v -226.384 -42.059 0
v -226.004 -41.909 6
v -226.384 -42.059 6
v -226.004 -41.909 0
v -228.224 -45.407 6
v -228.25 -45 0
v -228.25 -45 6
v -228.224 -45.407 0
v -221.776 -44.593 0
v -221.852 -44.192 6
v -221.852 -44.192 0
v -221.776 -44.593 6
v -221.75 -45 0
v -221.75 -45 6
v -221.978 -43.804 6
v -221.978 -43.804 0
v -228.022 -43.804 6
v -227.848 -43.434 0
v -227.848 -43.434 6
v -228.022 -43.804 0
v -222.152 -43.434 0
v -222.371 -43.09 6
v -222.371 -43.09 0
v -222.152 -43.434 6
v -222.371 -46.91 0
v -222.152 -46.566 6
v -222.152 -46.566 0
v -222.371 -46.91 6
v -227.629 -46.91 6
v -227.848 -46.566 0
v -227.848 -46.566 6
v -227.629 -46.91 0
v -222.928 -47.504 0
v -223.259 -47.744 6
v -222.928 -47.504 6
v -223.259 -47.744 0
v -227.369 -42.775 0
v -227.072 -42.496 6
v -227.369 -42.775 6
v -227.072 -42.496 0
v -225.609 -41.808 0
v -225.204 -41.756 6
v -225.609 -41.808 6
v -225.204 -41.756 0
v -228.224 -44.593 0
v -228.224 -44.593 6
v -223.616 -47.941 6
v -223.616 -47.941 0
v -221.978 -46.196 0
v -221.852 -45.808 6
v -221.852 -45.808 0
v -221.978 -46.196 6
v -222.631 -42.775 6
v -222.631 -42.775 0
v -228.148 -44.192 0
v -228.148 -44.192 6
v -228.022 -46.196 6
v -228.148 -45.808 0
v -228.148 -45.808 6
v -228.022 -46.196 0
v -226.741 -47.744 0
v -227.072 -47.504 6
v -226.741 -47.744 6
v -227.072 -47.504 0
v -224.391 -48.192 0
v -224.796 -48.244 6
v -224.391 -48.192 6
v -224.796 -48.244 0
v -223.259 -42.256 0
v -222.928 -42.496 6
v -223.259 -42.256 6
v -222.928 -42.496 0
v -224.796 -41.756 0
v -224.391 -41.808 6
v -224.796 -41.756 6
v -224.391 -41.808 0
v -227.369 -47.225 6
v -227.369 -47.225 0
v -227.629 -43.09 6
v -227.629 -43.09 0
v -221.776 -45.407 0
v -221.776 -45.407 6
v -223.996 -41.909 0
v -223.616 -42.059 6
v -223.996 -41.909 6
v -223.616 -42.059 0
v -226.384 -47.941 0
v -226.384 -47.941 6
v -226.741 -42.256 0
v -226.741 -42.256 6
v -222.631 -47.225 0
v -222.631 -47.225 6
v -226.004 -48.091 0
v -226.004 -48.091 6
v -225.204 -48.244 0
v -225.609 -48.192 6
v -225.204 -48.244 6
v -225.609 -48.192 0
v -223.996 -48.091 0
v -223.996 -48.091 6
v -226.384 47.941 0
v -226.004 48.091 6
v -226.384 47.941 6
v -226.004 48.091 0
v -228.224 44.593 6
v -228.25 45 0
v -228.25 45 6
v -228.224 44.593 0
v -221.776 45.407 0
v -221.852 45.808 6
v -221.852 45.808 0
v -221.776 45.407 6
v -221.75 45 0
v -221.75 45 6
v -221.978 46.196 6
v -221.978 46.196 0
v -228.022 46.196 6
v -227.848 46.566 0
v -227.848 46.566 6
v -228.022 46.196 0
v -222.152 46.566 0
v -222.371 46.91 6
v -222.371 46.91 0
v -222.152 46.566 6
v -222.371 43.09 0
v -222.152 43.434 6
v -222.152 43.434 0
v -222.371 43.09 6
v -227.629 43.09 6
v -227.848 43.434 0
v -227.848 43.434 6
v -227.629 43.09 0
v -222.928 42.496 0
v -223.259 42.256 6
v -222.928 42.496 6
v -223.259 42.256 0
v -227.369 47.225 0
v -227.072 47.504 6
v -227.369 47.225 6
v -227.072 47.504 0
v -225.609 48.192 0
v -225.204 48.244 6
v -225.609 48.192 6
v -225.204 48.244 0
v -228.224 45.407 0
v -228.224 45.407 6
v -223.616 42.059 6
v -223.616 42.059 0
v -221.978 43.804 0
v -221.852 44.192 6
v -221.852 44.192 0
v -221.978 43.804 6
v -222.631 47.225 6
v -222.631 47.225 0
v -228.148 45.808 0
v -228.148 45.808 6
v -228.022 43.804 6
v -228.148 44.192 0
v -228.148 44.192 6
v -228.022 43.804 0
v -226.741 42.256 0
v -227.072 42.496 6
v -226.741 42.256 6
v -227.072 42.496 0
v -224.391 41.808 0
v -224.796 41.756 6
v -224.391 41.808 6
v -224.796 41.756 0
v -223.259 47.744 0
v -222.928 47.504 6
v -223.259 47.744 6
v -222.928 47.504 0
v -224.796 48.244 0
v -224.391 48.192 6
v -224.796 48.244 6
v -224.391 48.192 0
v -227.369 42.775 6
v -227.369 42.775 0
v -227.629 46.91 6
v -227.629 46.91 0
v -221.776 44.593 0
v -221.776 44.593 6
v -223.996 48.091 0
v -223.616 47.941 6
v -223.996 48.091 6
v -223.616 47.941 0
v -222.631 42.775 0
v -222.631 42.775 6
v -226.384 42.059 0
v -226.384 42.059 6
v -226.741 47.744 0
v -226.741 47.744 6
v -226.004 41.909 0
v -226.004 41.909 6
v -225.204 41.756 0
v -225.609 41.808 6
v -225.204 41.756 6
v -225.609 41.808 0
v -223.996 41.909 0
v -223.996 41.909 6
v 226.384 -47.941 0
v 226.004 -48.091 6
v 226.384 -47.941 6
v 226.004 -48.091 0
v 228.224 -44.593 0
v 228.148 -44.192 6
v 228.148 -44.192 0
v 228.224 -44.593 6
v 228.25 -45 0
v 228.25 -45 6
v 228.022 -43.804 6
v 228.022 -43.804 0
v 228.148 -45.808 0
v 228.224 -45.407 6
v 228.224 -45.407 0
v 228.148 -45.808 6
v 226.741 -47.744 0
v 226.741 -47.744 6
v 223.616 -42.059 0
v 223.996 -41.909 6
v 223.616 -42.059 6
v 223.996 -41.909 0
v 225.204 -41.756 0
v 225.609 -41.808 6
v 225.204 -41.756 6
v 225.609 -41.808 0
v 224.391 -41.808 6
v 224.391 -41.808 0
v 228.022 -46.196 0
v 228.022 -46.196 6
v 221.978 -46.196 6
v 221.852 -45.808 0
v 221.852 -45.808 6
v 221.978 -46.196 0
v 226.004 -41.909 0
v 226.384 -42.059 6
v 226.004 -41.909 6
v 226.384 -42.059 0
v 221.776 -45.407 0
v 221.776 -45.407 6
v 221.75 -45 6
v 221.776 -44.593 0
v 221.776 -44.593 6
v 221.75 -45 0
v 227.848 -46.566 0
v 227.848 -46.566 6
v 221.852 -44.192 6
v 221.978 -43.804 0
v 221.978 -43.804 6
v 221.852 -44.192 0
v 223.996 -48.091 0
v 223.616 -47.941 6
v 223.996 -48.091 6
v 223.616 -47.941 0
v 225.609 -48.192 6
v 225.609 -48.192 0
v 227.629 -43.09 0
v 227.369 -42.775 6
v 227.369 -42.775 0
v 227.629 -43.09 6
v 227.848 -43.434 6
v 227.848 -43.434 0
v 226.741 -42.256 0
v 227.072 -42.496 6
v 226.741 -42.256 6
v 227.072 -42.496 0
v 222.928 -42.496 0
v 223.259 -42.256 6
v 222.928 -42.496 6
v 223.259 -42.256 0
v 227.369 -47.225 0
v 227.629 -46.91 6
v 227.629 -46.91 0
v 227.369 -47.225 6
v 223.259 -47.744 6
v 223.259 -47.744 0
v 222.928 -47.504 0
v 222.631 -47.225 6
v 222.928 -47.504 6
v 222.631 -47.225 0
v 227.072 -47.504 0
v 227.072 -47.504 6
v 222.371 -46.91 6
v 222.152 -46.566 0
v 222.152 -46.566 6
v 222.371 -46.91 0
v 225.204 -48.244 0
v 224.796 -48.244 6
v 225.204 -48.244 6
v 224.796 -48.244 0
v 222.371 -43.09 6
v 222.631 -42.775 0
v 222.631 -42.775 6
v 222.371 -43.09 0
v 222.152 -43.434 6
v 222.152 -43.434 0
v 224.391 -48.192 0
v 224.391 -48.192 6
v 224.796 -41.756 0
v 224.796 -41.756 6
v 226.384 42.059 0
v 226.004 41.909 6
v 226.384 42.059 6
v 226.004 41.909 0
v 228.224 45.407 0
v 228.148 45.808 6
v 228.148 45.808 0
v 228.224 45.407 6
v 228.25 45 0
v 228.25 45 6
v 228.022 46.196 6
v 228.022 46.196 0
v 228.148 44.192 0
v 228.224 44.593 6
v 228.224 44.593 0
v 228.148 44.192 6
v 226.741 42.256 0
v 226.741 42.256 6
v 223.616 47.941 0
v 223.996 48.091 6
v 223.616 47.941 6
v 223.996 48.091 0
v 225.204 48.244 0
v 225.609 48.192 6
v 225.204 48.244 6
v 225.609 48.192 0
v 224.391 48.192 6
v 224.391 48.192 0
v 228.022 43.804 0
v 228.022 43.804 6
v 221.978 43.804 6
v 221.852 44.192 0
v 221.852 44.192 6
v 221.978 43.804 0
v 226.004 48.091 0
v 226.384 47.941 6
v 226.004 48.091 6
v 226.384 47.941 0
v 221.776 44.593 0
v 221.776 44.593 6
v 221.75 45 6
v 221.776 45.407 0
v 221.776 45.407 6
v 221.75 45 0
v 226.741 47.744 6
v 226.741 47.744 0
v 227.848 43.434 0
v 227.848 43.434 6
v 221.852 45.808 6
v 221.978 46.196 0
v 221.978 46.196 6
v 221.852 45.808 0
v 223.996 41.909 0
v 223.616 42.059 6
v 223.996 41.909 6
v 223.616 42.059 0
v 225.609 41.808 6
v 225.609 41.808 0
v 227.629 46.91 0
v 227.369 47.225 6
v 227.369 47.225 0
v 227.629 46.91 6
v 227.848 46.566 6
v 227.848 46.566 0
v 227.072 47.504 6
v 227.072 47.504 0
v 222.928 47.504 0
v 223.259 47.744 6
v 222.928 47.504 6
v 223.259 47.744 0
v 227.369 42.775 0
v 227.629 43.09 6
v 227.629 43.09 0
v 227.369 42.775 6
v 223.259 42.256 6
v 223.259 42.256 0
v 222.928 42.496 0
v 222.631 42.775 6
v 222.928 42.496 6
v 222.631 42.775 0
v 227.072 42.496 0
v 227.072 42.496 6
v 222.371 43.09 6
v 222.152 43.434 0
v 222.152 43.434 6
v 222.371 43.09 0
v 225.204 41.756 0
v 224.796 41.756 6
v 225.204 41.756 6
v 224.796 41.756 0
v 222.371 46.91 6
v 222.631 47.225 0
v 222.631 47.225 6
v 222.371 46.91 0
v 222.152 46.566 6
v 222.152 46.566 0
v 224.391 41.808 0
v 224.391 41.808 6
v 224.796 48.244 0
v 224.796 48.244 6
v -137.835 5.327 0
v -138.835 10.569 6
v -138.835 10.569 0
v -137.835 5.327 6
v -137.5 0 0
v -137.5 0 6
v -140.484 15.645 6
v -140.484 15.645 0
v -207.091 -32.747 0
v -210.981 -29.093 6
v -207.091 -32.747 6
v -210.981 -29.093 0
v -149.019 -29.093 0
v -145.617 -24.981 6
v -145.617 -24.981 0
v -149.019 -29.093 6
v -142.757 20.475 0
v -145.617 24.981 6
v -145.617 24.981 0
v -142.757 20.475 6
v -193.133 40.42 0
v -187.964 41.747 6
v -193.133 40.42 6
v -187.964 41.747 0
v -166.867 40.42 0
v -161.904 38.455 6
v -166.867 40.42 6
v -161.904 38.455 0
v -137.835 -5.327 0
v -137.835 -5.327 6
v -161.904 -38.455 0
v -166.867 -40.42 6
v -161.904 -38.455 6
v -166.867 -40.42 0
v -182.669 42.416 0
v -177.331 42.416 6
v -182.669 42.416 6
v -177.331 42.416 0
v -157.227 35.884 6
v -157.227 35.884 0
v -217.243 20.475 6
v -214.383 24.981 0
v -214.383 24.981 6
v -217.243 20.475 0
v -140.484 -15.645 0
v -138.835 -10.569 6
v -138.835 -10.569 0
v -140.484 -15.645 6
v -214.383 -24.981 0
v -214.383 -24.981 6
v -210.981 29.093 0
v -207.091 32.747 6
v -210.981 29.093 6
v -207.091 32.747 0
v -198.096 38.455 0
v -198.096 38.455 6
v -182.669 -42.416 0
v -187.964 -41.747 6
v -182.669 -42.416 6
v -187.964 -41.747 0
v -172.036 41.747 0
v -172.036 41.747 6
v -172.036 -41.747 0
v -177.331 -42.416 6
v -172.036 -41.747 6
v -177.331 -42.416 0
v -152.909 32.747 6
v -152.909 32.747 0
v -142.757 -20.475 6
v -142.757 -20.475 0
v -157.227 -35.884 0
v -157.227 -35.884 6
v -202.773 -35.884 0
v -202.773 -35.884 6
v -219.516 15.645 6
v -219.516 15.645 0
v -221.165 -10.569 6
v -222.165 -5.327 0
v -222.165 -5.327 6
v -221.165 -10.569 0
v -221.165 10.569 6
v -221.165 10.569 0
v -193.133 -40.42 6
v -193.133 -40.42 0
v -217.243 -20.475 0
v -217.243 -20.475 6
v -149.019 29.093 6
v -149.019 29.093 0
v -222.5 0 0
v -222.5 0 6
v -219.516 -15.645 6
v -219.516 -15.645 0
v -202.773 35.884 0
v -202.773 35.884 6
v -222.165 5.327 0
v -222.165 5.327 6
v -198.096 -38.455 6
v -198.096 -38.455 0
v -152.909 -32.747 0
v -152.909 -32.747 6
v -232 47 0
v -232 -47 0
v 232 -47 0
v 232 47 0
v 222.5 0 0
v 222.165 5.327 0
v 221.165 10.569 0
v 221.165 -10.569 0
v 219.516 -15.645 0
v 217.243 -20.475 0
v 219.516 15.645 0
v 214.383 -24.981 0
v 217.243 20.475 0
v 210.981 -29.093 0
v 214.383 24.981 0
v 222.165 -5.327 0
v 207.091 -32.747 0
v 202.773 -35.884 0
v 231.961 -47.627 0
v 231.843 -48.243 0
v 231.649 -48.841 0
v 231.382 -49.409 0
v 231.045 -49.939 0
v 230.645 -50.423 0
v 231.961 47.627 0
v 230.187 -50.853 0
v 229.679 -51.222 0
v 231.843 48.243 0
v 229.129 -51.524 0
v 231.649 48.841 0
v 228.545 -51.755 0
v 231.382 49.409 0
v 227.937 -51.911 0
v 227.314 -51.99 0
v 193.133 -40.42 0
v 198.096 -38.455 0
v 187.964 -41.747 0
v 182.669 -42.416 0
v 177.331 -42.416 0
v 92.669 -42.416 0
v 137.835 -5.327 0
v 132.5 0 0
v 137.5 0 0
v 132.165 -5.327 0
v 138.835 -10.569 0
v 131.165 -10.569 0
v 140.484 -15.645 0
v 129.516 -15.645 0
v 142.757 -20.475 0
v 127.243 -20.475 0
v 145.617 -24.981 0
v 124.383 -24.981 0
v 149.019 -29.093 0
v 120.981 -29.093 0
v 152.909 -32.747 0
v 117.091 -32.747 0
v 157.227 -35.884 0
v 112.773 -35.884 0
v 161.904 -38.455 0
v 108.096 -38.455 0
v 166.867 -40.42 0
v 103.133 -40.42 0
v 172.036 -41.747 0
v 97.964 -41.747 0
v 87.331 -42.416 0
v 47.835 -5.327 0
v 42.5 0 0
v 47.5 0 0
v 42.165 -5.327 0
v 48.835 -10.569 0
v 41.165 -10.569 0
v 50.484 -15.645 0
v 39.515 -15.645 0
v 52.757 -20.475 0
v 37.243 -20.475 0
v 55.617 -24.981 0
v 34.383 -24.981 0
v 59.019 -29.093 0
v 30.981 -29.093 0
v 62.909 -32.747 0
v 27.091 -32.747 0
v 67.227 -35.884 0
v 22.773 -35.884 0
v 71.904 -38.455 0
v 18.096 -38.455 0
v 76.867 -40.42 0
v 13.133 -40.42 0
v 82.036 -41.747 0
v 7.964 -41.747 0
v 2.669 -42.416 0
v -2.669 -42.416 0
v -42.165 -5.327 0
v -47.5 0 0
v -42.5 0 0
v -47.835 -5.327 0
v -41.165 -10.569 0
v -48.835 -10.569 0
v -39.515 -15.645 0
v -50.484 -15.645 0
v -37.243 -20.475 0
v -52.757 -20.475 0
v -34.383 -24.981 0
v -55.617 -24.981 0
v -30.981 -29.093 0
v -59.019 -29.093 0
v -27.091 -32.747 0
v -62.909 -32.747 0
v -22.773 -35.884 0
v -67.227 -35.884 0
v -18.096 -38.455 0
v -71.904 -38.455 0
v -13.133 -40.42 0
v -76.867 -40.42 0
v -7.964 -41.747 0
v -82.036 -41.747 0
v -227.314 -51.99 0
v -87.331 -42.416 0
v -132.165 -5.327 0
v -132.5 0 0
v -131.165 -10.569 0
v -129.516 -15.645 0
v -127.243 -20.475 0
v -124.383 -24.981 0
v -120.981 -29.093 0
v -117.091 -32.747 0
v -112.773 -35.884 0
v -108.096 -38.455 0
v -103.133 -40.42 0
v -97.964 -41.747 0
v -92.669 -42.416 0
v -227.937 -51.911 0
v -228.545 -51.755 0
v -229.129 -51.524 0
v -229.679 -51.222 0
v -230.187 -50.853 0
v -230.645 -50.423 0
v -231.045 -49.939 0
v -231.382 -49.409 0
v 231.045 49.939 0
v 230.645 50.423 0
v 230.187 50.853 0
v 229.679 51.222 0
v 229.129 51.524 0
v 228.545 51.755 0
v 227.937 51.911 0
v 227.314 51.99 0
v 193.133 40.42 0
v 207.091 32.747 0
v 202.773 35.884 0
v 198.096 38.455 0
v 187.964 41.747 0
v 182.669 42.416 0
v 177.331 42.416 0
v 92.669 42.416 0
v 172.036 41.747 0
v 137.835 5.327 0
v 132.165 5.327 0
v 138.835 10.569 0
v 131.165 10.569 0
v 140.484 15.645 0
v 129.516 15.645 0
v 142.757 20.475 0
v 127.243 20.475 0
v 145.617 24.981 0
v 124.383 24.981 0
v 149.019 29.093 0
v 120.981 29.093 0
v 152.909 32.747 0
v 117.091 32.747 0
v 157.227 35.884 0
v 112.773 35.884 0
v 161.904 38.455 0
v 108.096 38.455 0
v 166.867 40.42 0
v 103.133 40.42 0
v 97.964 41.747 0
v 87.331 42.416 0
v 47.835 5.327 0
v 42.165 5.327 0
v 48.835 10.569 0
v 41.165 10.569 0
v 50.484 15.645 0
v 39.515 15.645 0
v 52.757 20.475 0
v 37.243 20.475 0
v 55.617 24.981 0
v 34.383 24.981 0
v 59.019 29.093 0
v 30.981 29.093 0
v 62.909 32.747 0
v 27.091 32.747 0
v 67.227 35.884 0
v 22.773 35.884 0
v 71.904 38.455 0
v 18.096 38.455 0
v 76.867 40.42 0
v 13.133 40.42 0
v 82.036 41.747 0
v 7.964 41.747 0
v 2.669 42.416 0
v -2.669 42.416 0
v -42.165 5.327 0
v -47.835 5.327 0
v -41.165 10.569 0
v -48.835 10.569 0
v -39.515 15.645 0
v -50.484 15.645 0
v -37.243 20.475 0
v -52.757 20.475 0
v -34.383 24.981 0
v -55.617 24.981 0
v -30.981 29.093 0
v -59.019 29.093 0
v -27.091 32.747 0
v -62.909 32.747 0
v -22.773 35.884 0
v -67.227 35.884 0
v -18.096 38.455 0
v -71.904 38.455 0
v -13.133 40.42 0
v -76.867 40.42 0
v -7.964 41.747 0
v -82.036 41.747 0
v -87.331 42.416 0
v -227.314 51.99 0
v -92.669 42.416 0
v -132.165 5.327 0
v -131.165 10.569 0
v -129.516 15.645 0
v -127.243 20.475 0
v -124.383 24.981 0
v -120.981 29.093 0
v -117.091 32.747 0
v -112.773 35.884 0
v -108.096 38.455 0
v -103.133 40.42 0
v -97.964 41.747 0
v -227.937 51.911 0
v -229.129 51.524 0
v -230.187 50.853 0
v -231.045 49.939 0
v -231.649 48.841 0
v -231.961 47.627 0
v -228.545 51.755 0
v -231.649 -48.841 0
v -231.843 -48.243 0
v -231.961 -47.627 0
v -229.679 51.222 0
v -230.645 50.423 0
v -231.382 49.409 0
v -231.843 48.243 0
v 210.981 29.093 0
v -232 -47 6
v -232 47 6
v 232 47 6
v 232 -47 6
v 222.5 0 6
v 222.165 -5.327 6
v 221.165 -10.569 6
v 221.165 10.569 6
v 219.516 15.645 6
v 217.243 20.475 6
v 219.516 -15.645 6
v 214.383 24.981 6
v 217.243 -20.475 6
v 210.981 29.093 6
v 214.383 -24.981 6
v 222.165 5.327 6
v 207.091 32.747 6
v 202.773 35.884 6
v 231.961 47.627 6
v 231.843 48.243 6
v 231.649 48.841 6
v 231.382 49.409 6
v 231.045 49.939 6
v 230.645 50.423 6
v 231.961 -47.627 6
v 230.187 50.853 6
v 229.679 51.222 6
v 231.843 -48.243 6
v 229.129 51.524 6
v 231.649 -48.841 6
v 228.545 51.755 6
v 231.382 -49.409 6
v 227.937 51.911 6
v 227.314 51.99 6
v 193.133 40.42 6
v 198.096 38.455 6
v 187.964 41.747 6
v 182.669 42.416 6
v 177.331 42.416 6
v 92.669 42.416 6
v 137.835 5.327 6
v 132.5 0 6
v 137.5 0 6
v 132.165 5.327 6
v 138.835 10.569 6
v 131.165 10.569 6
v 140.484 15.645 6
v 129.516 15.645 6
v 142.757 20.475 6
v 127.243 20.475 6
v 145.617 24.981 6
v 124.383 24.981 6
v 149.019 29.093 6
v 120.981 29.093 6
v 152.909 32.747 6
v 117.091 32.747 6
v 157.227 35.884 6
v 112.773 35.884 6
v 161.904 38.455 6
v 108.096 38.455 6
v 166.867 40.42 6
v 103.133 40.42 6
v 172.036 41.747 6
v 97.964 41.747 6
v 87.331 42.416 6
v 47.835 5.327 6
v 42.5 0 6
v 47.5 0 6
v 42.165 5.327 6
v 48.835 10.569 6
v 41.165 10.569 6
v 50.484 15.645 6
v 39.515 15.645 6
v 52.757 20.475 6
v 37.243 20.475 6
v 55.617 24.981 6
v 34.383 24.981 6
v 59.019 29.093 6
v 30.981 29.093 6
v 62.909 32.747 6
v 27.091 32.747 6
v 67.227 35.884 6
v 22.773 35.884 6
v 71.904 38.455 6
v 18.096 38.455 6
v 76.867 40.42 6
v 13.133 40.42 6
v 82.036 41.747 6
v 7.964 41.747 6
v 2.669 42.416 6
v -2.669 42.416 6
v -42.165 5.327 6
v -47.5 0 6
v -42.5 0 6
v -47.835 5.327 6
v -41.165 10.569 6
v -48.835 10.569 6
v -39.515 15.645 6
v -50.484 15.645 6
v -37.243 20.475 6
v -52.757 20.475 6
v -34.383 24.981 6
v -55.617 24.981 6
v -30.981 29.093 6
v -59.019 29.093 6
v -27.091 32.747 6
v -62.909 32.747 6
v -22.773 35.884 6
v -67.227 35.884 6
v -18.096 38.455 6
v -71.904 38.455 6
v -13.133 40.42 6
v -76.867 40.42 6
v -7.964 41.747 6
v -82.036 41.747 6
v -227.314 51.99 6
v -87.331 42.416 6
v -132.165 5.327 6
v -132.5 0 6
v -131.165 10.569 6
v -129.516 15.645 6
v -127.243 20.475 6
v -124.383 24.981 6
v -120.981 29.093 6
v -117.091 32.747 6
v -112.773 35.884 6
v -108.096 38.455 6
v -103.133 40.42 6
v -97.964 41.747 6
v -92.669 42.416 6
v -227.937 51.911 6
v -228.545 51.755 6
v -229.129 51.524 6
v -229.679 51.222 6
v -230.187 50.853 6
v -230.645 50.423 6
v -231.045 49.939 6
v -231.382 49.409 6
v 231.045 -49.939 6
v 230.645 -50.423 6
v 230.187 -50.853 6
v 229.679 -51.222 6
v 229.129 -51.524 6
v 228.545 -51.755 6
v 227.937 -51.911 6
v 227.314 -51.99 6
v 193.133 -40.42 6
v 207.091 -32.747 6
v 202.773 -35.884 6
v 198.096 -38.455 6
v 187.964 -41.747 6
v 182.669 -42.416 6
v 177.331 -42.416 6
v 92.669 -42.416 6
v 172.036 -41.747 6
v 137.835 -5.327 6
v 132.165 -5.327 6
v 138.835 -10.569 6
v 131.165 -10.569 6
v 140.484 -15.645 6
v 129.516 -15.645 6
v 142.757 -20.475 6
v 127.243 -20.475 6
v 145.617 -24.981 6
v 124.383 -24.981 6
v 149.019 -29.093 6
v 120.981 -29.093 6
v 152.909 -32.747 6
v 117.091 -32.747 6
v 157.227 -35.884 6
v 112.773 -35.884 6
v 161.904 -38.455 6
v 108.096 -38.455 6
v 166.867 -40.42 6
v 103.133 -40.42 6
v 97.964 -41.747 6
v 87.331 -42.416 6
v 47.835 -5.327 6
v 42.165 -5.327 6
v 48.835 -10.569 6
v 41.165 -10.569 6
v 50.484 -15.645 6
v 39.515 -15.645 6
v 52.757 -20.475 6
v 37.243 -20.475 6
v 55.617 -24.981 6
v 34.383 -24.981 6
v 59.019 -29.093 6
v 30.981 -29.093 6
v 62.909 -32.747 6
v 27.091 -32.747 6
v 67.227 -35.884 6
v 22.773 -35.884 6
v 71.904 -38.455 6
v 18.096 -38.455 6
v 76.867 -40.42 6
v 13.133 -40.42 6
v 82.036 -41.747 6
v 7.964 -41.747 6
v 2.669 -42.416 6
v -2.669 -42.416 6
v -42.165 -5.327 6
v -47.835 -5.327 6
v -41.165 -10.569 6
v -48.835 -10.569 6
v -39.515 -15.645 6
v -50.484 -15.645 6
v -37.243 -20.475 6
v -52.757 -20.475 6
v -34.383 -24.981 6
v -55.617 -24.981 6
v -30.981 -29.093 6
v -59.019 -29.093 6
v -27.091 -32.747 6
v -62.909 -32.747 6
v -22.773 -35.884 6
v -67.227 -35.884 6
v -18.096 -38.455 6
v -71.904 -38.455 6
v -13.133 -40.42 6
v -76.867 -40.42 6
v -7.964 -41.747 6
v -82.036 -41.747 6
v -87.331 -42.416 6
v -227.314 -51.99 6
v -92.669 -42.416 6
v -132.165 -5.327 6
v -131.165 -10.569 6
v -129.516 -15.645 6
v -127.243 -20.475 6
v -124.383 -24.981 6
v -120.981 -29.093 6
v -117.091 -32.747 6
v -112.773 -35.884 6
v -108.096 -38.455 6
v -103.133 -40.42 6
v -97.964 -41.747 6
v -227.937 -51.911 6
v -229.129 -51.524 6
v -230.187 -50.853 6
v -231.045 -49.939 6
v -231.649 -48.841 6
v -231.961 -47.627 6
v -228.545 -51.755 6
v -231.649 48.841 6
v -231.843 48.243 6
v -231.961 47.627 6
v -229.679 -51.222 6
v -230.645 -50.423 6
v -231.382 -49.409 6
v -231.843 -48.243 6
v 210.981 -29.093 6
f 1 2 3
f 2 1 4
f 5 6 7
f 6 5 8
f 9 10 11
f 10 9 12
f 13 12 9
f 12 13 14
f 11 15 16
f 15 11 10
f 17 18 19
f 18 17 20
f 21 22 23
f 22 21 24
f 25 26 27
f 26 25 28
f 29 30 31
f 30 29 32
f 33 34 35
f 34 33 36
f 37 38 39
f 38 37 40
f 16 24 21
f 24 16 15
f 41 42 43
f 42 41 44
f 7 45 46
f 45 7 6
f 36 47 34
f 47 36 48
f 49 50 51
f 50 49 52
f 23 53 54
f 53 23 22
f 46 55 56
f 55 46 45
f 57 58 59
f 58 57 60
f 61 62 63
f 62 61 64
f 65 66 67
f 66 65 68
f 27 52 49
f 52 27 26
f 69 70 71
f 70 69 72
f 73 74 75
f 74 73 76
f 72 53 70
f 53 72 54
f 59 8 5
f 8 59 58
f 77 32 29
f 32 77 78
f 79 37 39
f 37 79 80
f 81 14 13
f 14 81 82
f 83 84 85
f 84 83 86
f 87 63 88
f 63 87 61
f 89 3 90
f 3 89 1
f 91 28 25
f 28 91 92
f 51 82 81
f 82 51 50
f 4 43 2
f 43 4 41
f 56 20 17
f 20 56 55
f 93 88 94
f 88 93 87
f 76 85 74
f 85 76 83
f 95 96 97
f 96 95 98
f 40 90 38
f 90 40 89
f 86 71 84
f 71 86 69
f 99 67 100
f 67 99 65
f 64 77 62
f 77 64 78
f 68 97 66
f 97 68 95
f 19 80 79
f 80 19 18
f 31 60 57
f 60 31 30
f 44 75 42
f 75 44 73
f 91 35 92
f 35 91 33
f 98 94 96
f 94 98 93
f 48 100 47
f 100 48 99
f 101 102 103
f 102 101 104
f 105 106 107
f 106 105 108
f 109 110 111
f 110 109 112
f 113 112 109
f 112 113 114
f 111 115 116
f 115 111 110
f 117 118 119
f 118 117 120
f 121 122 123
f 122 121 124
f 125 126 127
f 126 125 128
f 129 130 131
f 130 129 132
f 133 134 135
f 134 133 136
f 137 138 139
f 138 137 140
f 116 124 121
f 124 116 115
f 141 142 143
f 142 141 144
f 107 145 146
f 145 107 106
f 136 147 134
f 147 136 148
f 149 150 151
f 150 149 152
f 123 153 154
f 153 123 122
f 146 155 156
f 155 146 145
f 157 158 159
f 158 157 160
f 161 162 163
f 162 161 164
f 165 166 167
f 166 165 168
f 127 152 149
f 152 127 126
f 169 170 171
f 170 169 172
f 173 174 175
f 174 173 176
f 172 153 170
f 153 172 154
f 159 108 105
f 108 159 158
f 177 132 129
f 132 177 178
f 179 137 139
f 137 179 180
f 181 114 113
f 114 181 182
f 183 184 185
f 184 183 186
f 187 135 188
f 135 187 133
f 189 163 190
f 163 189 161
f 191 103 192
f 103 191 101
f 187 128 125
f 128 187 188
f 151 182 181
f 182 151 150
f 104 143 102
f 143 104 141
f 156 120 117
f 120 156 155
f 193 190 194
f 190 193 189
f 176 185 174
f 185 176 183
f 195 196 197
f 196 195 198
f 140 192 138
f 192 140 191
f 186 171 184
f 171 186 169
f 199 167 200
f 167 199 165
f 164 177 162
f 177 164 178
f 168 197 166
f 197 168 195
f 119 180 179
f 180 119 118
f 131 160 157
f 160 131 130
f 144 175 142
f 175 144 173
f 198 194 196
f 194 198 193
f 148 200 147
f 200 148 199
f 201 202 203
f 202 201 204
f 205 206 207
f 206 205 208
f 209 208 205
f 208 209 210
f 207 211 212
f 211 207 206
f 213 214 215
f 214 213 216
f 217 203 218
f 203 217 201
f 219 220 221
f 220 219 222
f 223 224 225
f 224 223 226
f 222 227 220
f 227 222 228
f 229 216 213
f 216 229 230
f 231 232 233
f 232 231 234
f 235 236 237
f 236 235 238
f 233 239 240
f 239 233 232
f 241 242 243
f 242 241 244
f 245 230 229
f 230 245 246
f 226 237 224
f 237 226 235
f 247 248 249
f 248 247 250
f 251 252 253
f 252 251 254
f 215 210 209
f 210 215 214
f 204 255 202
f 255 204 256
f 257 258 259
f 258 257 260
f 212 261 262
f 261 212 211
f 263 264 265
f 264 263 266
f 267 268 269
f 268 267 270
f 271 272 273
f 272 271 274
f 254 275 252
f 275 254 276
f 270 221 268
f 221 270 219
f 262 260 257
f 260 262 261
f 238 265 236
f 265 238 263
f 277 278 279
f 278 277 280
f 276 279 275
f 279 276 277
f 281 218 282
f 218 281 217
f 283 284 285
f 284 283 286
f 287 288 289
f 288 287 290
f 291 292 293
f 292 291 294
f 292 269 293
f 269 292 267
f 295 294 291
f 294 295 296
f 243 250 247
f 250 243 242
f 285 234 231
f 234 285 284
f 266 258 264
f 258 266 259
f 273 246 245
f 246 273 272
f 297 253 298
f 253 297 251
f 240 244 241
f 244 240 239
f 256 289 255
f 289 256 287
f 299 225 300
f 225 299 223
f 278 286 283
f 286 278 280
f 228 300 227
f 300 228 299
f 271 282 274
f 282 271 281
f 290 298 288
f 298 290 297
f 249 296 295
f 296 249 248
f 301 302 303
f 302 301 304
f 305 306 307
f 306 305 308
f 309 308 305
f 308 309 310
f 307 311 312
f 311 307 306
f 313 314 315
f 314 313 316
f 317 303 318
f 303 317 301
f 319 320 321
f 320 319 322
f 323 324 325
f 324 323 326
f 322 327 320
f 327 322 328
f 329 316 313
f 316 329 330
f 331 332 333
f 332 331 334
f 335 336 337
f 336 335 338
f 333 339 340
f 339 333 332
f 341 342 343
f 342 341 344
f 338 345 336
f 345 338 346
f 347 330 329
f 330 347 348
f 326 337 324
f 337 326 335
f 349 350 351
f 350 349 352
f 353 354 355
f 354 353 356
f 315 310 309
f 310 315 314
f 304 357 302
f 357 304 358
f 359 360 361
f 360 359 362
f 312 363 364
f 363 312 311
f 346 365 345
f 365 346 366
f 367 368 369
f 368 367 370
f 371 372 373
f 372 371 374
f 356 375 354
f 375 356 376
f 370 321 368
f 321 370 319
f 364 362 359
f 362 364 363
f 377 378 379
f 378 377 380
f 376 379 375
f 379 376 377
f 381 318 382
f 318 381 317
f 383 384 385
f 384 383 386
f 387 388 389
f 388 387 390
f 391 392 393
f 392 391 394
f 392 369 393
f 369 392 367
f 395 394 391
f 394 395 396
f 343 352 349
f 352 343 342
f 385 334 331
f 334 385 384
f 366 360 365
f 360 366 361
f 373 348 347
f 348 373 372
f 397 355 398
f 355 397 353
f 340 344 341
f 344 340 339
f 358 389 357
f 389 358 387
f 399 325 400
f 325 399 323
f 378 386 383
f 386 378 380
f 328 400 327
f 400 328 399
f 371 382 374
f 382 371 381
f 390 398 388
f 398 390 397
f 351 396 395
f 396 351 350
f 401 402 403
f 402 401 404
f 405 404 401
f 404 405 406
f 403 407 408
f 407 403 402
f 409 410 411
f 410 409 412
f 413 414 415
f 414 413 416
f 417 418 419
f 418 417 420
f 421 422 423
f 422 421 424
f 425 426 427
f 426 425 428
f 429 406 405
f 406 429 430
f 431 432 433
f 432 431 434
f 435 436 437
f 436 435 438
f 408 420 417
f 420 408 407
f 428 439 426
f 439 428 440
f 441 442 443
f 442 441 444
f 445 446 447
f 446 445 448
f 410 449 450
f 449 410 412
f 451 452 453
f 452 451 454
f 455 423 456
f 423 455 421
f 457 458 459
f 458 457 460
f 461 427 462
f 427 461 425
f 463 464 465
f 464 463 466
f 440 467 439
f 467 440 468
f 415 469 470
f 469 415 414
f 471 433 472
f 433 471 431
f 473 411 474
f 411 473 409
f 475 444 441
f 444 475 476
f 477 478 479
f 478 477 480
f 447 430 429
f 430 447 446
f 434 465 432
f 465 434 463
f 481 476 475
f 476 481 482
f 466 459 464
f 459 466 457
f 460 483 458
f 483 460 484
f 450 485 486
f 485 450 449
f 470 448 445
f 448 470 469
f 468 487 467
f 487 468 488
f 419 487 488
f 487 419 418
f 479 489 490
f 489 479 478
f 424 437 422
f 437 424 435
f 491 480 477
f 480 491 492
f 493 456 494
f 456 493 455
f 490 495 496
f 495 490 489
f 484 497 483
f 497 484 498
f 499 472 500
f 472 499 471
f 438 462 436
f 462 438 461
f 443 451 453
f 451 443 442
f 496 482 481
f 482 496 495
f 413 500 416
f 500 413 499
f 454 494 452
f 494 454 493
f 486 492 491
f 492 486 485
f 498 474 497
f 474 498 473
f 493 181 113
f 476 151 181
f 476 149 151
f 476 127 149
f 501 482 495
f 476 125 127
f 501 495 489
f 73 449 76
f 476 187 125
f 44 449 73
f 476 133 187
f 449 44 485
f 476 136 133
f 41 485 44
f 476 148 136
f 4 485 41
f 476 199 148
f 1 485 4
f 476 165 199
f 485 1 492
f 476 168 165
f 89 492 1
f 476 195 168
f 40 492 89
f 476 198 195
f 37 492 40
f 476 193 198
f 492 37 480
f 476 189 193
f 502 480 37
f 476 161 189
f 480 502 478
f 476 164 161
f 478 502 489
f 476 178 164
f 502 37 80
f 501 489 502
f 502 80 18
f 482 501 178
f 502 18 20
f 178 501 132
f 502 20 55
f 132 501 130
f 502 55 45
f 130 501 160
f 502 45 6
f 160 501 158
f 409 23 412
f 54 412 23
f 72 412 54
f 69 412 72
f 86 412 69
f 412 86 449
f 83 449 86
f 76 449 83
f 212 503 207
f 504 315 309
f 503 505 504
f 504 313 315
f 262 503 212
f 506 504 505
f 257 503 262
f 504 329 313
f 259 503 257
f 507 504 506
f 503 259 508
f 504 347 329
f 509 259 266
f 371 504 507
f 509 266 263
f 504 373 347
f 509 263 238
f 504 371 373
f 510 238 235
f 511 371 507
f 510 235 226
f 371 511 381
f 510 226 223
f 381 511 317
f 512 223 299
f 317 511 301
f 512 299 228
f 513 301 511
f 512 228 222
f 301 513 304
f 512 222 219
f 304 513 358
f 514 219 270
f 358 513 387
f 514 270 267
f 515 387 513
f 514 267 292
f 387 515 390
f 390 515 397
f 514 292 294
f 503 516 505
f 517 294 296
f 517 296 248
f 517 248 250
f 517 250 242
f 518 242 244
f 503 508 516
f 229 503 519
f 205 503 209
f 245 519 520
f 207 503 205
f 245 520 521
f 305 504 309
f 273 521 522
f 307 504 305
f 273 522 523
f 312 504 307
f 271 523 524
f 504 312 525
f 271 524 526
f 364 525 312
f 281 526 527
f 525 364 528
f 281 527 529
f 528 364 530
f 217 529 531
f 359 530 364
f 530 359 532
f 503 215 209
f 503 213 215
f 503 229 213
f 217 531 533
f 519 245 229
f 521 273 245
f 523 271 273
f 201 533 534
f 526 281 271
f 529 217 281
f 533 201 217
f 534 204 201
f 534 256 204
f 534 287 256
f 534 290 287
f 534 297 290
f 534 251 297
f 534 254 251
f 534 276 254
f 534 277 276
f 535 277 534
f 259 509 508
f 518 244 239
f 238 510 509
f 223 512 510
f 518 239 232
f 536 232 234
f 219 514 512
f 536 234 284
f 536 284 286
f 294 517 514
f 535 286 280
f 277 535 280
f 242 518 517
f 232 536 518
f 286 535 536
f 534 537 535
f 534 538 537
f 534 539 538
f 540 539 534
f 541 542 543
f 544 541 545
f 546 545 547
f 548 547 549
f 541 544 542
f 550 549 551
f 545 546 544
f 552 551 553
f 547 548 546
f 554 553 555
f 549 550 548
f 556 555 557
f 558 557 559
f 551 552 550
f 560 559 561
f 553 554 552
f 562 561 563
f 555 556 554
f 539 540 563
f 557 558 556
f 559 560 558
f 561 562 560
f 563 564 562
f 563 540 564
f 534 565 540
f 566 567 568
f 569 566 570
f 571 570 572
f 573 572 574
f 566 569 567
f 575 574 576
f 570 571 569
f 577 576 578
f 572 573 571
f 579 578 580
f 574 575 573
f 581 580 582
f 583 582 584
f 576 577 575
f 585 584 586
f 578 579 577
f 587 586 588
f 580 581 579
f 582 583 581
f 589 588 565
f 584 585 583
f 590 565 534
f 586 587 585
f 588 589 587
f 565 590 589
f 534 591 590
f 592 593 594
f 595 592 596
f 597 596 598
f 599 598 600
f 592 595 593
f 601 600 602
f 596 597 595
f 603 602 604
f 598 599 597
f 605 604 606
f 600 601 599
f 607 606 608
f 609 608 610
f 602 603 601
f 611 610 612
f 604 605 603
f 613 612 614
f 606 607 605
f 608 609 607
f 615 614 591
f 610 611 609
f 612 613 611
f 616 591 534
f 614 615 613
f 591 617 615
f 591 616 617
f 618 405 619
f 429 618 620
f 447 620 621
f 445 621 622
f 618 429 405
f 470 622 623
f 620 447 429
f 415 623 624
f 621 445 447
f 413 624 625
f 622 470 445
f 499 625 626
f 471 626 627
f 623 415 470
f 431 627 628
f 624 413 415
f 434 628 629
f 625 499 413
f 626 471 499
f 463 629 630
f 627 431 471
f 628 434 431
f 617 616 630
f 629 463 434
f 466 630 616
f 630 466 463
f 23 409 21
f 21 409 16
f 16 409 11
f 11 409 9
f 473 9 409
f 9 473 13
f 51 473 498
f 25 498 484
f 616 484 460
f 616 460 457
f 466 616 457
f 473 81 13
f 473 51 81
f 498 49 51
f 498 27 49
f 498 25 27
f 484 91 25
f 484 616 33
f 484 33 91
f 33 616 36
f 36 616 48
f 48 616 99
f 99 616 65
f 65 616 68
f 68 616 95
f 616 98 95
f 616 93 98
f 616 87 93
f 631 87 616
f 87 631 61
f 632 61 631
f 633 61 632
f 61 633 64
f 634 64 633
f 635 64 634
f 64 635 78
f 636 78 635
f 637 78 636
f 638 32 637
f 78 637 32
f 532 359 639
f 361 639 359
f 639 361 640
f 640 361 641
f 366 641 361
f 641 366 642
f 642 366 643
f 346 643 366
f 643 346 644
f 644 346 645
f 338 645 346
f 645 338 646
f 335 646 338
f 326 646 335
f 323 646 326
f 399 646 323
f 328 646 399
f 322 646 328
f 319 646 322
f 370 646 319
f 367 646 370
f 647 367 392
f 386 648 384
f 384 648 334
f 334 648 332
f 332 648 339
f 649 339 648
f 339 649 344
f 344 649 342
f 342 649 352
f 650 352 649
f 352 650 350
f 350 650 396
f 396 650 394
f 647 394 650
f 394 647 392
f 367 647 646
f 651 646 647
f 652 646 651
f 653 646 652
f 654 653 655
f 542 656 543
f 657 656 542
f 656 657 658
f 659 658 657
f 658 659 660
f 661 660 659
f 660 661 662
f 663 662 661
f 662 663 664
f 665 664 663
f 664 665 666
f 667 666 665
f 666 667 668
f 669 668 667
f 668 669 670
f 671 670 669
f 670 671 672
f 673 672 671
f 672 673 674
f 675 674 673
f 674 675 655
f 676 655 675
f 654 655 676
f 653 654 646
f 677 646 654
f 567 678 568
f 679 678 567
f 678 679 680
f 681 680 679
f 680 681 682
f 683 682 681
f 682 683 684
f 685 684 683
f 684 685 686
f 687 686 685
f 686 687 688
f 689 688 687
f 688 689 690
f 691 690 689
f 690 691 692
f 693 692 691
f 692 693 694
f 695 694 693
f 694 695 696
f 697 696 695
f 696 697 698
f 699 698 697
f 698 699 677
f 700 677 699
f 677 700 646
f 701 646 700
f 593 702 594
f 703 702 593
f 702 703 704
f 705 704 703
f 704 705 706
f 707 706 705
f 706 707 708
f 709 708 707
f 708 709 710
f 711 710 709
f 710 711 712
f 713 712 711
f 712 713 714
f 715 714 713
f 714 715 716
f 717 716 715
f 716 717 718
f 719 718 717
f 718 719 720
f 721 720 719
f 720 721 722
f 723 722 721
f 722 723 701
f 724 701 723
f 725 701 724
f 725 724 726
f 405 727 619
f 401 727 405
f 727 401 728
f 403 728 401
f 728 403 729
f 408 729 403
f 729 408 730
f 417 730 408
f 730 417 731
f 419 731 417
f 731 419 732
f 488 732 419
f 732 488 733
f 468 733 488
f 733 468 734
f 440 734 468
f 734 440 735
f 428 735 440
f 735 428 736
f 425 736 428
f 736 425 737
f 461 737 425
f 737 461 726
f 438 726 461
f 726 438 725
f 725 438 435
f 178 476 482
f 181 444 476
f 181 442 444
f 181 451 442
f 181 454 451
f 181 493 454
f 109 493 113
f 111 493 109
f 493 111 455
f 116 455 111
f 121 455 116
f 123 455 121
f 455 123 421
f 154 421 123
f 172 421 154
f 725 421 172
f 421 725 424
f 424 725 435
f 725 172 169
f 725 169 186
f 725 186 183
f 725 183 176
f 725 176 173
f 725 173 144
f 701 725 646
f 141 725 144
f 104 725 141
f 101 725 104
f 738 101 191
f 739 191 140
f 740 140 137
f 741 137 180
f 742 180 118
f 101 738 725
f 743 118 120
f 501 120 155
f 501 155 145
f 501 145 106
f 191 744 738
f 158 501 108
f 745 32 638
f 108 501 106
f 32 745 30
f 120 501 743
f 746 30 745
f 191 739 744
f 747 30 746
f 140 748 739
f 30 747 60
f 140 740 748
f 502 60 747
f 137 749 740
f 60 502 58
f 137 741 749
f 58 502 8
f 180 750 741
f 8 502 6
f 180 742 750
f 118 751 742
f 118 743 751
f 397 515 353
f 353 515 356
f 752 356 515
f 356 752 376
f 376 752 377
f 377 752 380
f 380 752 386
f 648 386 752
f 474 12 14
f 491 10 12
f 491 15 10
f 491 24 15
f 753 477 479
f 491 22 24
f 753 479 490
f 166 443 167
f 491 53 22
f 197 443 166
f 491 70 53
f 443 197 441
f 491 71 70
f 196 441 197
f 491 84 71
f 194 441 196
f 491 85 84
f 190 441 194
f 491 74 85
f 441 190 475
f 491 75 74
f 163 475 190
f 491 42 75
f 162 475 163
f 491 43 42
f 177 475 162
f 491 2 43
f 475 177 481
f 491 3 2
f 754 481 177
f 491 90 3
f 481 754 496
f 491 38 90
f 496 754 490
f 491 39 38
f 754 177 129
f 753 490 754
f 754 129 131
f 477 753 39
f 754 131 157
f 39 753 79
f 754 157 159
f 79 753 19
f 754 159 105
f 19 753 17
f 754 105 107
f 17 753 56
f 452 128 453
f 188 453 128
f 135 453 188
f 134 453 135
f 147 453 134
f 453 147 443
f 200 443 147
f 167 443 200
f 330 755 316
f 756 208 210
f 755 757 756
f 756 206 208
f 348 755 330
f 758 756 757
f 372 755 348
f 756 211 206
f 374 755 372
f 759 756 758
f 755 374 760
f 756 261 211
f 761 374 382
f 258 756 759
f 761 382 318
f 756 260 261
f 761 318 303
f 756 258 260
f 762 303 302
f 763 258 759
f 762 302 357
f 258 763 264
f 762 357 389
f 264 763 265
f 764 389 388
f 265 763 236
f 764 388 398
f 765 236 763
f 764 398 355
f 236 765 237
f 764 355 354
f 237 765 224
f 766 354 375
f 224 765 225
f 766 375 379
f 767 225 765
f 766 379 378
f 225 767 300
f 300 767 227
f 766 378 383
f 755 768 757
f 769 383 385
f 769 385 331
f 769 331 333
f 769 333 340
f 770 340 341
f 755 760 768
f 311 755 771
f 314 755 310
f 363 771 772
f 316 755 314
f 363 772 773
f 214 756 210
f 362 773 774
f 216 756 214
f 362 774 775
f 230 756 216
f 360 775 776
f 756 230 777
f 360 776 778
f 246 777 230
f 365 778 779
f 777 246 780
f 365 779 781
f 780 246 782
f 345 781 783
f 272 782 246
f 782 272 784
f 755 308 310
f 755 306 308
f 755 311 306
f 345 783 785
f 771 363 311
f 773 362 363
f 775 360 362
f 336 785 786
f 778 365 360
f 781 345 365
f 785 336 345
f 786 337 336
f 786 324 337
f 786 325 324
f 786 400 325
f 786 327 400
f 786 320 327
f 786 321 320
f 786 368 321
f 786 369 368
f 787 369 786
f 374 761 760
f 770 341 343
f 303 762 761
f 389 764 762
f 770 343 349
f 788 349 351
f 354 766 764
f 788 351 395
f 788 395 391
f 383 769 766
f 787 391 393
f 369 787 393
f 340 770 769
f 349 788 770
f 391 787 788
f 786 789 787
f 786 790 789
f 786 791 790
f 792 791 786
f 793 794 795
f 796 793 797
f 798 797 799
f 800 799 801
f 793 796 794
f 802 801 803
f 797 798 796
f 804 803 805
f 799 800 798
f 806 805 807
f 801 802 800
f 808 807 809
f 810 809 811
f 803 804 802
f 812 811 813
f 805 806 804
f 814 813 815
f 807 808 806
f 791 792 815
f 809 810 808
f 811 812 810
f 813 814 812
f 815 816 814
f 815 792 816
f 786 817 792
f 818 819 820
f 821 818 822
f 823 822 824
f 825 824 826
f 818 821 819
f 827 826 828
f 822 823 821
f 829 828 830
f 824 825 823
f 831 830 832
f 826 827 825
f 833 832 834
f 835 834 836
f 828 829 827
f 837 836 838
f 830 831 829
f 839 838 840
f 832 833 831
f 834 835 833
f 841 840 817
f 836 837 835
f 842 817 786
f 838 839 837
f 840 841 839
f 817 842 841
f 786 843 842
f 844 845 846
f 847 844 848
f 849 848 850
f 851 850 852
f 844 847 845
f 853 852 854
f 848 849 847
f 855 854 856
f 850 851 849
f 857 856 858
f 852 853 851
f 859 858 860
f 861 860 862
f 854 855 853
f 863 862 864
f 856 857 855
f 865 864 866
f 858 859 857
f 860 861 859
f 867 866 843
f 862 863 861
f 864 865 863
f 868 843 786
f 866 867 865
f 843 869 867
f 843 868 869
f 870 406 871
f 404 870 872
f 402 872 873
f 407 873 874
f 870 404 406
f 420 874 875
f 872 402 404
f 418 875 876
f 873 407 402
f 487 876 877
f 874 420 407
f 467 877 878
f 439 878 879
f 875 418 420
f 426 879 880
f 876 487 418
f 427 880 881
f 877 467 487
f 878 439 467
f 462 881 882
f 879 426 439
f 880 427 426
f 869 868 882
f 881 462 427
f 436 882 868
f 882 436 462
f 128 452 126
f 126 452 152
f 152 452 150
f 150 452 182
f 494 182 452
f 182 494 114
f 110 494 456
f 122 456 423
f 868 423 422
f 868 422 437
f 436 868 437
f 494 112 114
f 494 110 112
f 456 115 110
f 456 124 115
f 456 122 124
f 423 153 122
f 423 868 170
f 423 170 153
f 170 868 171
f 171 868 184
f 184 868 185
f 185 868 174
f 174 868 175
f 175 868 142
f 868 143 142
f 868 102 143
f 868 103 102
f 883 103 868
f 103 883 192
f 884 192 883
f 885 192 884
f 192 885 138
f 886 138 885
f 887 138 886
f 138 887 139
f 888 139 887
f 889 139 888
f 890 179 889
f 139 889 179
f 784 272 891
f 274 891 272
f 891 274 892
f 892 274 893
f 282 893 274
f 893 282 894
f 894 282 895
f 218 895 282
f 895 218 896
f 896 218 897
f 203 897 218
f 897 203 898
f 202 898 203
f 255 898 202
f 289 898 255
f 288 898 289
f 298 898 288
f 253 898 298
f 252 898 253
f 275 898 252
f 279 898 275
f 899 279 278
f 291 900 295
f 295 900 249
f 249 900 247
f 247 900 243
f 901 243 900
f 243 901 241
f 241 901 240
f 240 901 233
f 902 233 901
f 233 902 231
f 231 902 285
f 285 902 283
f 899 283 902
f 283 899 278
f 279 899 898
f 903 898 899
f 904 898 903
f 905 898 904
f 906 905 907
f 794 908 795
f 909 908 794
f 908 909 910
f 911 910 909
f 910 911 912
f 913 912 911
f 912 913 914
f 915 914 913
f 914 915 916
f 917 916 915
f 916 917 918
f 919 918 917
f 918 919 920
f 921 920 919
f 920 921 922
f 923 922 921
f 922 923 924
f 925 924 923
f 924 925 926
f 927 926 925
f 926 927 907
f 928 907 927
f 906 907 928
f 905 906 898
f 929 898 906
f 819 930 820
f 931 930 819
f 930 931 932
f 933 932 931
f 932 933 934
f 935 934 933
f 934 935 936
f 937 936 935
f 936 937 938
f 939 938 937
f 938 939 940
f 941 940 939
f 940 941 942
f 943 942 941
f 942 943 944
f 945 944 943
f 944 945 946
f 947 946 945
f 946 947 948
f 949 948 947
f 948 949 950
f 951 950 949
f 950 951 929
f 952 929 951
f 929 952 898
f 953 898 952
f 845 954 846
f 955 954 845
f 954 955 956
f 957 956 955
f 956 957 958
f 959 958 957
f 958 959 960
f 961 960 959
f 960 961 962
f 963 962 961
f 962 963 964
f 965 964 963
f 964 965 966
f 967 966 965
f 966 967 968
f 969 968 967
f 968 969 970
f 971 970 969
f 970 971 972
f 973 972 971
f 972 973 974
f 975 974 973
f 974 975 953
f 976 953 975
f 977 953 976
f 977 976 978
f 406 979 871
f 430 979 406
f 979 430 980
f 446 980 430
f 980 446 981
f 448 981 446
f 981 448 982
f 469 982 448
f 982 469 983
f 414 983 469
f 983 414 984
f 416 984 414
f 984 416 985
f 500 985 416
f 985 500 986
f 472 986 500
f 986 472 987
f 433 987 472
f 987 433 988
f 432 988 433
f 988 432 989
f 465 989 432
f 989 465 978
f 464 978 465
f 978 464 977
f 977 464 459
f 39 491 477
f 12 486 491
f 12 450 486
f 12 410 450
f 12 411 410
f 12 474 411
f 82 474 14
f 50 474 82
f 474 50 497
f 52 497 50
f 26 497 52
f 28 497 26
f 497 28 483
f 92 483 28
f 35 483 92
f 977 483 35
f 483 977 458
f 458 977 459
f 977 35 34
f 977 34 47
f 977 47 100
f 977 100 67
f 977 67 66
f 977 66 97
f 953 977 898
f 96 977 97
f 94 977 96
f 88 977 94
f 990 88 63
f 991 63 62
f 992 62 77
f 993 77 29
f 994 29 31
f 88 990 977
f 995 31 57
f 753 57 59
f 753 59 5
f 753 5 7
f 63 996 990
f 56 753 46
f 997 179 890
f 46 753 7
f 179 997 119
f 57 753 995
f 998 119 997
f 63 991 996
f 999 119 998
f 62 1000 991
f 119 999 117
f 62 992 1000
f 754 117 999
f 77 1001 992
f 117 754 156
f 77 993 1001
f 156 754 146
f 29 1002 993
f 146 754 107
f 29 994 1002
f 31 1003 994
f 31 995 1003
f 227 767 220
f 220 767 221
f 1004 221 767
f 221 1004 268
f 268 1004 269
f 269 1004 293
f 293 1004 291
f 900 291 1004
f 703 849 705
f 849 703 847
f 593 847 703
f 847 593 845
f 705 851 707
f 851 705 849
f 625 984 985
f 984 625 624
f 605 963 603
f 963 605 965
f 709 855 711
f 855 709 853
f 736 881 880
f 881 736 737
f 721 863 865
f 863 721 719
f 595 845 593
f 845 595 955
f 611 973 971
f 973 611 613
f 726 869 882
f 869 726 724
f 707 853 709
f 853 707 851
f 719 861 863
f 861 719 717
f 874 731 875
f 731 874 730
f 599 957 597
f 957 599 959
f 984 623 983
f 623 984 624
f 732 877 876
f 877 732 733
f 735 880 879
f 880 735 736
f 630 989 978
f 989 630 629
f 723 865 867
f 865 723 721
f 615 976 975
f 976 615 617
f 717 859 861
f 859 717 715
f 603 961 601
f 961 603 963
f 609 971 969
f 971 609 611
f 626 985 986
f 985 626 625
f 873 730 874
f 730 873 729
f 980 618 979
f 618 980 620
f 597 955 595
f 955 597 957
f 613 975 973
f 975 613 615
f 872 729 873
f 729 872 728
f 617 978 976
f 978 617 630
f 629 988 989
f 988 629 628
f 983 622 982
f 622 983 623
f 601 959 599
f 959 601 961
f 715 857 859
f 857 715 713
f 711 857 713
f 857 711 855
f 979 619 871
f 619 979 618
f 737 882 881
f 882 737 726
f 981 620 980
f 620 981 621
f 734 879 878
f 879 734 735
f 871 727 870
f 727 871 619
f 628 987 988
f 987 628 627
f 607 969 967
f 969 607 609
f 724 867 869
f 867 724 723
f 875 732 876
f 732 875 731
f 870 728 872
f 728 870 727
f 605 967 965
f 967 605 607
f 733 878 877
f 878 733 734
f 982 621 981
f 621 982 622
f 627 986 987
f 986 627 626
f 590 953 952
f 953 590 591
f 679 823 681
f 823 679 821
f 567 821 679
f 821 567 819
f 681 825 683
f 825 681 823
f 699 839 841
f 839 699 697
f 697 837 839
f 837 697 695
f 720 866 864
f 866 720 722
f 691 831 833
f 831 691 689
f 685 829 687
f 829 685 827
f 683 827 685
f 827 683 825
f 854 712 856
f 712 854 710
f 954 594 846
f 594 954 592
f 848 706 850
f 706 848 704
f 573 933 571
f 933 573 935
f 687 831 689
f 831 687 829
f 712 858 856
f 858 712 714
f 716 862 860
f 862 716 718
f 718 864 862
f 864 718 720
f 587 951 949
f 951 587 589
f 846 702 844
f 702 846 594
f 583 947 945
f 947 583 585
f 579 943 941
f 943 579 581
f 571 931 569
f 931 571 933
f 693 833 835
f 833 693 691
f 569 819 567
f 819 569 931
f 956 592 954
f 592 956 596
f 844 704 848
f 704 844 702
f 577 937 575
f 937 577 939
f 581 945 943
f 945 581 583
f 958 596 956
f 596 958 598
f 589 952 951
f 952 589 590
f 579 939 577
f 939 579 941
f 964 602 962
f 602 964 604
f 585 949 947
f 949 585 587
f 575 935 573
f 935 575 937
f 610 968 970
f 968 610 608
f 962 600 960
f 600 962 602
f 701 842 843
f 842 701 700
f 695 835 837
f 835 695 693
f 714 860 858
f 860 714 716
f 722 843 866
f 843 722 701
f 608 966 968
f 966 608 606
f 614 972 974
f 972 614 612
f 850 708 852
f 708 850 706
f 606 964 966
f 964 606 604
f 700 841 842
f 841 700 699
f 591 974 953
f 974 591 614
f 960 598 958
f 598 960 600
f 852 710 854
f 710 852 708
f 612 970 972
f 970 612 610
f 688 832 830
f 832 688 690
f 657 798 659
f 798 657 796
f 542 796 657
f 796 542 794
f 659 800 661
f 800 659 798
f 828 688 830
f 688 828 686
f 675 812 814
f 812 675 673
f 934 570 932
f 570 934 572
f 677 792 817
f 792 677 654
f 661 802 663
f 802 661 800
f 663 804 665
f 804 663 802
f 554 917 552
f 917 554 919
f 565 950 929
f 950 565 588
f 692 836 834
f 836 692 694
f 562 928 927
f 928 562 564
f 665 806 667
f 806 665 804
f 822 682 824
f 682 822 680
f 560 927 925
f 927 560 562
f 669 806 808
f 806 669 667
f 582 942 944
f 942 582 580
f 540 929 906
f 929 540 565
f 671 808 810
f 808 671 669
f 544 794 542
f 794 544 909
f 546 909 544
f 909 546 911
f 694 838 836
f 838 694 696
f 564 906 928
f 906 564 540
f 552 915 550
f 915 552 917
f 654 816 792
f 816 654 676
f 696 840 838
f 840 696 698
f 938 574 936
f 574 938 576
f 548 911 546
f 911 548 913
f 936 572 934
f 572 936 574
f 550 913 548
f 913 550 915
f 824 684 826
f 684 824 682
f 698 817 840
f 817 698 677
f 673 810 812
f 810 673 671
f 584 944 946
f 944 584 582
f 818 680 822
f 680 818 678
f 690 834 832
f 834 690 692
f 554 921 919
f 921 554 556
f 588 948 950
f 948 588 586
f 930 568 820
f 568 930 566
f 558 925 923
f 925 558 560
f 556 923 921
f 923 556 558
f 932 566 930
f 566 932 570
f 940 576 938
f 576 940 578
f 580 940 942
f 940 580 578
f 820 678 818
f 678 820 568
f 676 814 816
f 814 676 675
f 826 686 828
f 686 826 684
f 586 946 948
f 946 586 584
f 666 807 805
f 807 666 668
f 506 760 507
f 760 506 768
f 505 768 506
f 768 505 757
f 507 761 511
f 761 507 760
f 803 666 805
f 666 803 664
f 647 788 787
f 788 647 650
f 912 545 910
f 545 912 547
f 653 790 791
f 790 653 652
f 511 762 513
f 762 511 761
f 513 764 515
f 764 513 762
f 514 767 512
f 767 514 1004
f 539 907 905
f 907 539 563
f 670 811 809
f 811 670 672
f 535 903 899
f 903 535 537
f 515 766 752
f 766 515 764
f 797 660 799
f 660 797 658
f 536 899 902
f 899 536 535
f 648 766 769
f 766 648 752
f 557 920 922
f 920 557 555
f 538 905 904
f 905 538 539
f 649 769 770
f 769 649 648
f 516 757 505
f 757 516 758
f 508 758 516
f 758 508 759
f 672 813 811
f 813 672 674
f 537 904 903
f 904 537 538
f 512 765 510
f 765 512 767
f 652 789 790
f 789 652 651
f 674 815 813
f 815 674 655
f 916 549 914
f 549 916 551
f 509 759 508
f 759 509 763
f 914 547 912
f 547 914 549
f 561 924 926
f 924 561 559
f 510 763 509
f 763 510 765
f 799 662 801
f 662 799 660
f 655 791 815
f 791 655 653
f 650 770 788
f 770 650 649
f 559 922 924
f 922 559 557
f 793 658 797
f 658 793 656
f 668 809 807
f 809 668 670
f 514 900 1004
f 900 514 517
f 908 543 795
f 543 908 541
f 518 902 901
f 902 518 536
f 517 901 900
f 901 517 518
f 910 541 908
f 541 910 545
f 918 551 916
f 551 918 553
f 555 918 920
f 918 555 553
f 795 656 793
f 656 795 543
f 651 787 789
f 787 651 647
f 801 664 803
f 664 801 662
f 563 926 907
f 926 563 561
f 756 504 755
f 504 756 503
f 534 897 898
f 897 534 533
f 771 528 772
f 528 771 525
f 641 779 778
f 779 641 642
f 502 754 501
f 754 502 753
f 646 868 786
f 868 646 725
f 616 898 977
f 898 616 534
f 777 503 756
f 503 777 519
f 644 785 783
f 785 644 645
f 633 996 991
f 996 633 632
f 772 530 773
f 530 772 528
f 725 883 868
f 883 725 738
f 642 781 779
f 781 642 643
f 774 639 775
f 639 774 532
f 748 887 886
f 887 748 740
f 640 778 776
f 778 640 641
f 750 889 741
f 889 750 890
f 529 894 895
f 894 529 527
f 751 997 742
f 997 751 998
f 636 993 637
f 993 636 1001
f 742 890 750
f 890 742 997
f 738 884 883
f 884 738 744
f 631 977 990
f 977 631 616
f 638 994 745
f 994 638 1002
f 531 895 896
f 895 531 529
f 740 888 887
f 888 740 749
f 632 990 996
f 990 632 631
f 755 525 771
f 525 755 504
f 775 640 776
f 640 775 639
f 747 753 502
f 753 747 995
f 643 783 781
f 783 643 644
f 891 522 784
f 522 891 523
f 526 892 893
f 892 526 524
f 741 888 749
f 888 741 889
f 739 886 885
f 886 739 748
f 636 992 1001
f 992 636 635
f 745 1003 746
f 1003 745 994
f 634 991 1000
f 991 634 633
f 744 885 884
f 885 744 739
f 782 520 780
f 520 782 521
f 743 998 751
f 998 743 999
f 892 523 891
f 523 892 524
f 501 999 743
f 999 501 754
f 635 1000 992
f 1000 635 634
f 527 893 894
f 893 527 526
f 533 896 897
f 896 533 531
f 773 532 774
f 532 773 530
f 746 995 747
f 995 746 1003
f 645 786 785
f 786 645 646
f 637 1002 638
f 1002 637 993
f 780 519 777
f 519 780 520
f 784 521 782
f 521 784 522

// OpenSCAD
$fn = 50;

difference() {
	union() {
		hull() {
			translate(v = [-227.0, 47.0, 0]) {
				cylinder(h = 6, r = 5);
			}
			translate(v = [227.0, 47.0, 0]) {
				cylinder(h = 6, r = 5);
			}
			translate(v = [-227.0, -47.0, 0]) {
				cylinder(h = 6, r = 5);
			}
			translate(v = [227.0, -47.0, 0]) {
				cylinder(h = 6, r = 5);
			}
		}
	}
	union() {
		translate(v = [-225.0, -45.0, -100.0]) {
			cylinder(h = 200, r = 3.25);
		}
		translate(v = [-225.0, 45.0, -100.0]) {
			cylinder(h = 200, r = 3.25);
		}
		translate(v = [225.0, -45.0, -100.0]) {
			cylinder(h = 200, r = 3.25);
		}
		translate(v = [225.0, 45.0, -100.0]) {
			cylinder(h = 200, r = 3.25);
		}
		translate(v = [-225.0, -45.0, -100.0]) {
			cylinder(h = 200, r = 1.8);
		}
		translate(v = [-225.0, 45.0, -100.0]) {
			cylinder(h = 200, r = 1.8);
		}
		translate(v = [225.0, -45.0, -100.0]) {
			cylinder(h = 200, r = 1.8);
		}
		translate(v = [225.0, 45.0, -100.0]) {
			cylinder(h = 200, r = 1.8);
		}
		translate(v = [-180.0, 0, 0.0]) {
			cylinder(h = 6, r = 42.5);
		}
		translate(v = [-90.0, 0, 0.0]) {
			cylinder(h = 6, r = 42.5);
		}
		cylinder(h = 6, r = 42.5);
		translate(v = [90.0, 0, 0.0]) {
			cylinder(h = 6, r = 42.5);
		}
		translate(v = [180.0, 0, 0.0]) {
			cylinder(h = 6, r = 42.5);
		}
	}
}
